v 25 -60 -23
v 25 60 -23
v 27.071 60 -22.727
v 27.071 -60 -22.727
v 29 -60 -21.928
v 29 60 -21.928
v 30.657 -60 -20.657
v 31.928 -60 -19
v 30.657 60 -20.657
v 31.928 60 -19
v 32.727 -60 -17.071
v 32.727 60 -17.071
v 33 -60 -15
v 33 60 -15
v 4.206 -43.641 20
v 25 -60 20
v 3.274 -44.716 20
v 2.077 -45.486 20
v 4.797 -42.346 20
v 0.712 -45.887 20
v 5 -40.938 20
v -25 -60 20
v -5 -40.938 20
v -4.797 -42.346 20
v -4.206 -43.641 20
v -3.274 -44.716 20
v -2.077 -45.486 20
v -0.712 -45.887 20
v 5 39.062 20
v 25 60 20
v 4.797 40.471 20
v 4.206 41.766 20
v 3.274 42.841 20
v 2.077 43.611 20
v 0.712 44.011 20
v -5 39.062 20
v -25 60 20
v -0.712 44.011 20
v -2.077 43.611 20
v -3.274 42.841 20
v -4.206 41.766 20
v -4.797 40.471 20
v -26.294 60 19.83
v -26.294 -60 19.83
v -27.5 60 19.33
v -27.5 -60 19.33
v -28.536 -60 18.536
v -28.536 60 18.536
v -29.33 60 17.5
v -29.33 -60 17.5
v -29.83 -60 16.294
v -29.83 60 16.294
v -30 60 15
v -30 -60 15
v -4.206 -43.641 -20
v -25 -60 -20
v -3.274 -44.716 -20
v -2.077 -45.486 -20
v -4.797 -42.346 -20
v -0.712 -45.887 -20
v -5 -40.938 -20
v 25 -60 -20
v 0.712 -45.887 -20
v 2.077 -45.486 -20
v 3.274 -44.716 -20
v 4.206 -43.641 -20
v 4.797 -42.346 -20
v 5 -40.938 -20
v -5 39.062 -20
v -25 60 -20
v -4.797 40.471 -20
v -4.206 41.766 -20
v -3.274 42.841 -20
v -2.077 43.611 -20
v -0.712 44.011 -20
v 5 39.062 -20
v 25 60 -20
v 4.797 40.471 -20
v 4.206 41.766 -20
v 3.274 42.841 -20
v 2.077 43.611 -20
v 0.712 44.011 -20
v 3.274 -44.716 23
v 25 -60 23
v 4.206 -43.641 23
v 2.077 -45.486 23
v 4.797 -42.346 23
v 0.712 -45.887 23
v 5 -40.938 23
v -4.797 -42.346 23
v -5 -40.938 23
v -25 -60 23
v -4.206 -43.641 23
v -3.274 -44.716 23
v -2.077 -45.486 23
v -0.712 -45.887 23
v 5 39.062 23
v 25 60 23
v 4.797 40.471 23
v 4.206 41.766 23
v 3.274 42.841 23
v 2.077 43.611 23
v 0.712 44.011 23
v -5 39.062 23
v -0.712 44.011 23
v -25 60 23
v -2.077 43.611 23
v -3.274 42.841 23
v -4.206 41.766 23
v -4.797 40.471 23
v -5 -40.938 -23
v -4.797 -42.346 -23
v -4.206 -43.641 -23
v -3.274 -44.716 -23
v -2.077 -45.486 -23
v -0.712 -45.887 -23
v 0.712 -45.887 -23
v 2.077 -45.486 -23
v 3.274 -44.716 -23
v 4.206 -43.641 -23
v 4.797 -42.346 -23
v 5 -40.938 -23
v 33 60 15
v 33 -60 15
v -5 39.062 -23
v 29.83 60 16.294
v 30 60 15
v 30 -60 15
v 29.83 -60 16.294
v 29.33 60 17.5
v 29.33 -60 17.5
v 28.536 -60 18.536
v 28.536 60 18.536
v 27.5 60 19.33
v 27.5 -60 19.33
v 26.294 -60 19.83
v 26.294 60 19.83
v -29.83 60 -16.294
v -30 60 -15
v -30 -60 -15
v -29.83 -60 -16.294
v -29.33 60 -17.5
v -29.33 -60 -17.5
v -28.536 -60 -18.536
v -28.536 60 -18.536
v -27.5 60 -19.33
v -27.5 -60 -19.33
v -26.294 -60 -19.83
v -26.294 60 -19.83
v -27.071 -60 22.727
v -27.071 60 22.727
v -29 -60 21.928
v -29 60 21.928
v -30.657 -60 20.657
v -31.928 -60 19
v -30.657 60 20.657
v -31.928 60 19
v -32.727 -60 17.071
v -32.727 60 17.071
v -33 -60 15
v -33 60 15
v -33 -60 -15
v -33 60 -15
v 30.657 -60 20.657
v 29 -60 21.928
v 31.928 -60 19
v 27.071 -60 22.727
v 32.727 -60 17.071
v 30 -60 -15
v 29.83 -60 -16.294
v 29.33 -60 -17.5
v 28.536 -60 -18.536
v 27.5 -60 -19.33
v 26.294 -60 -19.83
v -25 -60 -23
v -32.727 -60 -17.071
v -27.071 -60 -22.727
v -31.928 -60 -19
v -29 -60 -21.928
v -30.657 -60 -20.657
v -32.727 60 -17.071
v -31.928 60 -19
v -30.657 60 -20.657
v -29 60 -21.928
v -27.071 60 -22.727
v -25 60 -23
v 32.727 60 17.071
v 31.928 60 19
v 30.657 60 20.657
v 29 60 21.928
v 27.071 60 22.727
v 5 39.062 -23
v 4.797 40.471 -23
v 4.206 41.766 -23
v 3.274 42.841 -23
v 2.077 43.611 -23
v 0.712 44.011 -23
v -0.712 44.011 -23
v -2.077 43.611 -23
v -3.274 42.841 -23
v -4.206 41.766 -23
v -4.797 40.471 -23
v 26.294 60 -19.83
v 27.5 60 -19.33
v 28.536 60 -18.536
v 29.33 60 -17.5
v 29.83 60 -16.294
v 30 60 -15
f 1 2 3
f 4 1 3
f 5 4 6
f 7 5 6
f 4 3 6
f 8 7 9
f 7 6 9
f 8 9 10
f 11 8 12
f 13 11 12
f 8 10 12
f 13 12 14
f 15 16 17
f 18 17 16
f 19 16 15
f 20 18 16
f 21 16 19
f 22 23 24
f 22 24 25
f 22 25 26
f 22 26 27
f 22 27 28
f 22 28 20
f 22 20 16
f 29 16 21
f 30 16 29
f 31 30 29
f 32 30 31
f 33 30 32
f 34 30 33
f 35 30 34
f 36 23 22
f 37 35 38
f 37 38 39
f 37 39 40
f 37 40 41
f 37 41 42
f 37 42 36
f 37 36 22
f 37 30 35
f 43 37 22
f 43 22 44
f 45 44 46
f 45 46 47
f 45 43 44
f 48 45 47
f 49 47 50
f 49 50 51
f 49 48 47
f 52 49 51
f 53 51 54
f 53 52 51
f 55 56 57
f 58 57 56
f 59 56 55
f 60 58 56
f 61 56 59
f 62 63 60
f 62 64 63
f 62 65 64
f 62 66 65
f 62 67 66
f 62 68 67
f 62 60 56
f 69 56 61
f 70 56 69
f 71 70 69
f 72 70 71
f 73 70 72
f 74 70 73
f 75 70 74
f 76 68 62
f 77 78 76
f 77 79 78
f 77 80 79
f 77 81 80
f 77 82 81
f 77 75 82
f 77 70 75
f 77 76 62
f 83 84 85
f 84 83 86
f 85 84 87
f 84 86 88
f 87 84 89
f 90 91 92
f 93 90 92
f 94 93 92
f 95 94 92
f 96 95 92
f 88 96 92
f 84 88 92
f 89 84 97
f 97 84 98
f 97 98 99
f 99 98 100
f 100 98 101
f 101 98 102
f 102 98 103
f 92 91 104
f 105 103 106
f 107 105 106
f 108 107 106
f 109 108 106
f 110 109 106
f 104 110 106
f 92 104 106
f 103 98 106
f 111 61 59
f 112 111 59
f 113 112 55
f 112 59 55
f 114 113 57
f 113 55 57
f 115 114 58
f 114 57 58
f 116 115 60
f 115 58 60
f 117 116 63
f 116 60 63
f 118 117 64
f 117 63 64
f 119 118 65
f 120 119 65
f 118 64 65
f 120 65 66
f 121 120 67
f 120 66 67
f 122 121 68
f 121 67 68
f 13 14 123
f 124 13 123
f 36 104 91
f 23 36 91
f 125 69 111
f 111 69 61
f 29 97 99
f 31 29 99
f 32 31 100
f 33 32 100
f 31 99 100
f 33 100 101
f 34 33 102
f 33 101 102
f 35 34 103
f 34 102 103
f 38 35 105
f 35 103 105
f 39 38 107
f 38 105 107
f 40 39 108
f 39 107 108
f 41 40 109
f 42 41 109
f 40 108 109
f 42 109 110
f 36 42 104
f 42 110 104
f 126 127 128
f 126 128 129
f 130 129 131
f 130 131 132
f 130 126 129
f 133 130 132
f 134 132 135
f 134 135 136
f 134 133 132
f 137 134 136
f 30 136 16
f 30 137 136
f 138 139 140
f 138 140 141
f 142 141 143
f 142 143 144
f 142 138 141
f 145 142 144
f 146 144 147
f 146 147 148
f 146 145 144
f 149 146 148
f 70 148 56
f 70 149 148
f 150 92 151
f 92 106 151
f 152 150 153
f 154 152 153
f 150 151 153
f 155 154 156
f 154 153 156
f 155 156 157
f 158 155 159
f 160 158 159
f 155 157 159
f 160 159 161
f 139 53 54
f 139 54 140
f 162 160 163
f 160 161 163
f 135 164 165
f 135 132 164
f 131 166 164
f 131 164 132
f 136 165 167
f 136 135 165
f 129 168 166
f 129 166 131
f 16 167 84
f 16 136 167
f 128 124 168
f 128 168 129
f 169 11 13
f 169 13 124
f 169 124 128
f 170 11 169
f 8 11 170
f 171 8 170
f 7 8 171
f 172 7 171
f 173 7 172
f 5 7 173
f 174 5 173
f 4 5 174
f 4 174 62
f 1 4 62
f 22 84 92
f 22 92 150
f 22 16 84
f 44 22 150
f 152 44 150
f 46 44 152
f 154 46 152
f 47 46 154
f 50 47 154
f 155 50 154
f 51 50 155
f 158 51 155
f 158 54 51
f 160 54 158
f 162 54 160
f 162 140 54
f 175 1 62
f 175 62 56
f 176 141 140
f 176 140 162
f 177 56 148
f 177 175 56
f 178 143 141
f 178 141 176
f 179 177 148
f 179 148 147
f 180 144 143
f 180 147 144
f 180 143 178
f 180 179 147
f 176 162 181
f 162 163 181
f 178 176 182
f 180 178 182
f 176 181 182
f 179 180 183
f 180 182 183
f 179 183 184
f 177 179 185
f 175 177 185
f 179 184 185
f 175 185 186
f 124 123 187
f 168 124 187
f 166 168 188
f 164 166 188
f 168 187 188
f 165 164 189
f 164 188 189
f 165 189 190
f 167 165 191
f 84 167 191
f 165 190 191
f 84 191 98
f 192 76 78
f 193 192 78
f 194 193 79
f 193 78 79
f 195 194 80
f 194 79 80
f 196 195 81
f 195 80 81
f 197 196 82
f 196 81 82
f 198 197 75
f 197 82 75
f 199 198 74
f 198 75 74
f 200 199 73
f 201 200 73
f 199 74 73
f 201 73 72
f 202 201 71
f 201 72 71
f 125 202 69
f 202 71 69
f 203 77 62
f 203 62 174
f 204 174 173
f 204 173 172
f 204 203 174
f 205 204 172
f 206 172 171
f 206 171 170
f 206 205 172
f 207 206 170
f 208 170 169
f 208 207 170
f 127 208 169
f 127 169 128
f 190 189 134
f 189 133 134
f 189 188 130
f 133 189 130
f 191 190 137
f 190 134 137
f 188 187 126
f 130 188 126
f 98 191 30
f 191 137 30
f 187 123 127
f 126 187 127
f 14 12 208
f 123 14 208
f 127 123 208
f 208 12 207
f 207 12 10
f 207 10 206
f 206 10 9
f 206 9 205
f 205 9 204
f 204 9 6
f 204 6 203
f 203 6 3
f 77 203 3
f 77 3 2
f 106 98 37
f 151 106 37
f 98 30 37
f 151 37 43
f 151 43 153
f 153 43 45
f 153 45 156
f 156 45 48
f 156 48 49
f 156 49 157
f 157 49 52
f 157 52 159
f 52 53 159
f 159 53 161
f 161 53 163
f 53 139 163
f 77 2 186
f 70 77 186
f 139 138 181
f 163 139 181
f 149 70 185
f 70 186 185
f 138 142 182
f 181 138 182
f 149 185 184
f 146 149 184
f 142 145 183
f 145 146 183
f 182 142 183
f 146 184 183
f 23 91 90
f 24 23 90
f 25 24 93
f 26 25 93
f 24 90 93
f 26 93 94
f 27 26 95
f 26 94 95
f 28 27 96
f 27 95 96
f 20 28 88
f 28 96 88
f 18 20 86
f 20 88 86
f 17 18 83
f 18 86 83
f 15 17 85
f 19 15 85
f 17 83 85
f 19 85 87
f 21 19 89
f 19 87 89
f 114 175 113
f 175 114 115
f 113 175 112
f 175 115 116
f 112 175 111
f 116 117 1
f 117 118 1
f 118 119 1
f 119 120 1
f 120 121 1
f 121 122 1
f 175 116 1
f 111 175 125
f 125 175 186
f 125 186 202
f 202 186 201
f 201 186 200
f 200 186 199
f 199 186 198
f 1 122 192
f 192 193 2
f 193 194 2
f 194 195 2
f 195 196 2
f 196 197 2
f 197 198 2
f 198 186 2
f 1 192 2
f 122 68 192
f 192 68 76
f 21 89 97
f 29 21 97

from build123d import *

# Parameters (mm, degrees)
EXTRUDE_THIN1_DEPTH     = 60
CUT_EXTRUDE1_DEPTH      = 83.492423895
CUT_EXTRUDE1_DEPTH_BACK = 83.492423895


with BuildPart() as part:
    # Sketch1 → Extrude-Thin1 (new, symmetric)
    with BuildSketch(Plane(origin=(0, 0, 0), x_dir=(1, 0, 0), z_dir=(0, 1, 0))):
        with BuildLine():
            Line((25, -23), (-25, -23))
            ThreePointArc((-25, -23), (-30.656854249, -20.656854249), (-33, -15))
            Line((-33, -15), (-33, 15))
            ThreePointArc((-33, 15), (-30.656854249, 20.656854249), (-25, 23))
            Line((-25, 23), (25, 23))
            ThreePointArc((25, 23), (30.656854249, 20.656854249), (33, 15))
            Line((33, 15), (33, -15))
            ThreePointArc((33, -15), (30.656854249, -20.656854249), (25, -23))
        make_face()
        with BuildLine():
            Line((25, -20), (-25, -20))
            ThreePointArc((-25, -20), (-28.535533906, -18.535533906), (-30, -15))
            Line((-30, -15), (-30, 15))
            ThreePointArc((-30, 15), (-28.535533906, 18.535533906), (-25, 20))
            Line((-25, 20), (25, 20))
            ThreePointArc((25, 20), (28.535533906, 18.535533906), (30, 15))
            Line((30, 15), (30, -15))
            ThreePointArc((30, -15), (28.535533906, -18.535533906), (25, -20))
        make_face(mode=Mode.SUBTRACT)
    extrude(amount=EXTRUDE_THIN1_DEPTH, both=True)

    # Sketch3 → Cut-Extrude1 (cut, two sides: drawn at the far end of the back side and taken through both)
    with BuildSketch(Plane(origin=(0, 0, -23), x_dir=(-1, 0, 0), z_dir=(0, 0, -1)).offset(-CUT_EXTRUDE1_DEPTH_BACK)):
        with BuildLine():
            Line((-5, -40.937612565), (-5, 39.062387435))
            ThreePointArc((-5, 39.062387435), (0, 44.062387435), (5, 39.062387435))
            Line((5, 39.062387435), (5, -40.937612565))
            ThreePointArc((5, -40.937612565), (0, -45.937612565), (-5, -40.937612565))
        make_face()
    extrude(amount=CUT_EXTRUDE1_DEPTH + CUT_EXTRUDE1_DEPTH_BACK, mode=Mode.SUBTRACT)


solid = part.part
